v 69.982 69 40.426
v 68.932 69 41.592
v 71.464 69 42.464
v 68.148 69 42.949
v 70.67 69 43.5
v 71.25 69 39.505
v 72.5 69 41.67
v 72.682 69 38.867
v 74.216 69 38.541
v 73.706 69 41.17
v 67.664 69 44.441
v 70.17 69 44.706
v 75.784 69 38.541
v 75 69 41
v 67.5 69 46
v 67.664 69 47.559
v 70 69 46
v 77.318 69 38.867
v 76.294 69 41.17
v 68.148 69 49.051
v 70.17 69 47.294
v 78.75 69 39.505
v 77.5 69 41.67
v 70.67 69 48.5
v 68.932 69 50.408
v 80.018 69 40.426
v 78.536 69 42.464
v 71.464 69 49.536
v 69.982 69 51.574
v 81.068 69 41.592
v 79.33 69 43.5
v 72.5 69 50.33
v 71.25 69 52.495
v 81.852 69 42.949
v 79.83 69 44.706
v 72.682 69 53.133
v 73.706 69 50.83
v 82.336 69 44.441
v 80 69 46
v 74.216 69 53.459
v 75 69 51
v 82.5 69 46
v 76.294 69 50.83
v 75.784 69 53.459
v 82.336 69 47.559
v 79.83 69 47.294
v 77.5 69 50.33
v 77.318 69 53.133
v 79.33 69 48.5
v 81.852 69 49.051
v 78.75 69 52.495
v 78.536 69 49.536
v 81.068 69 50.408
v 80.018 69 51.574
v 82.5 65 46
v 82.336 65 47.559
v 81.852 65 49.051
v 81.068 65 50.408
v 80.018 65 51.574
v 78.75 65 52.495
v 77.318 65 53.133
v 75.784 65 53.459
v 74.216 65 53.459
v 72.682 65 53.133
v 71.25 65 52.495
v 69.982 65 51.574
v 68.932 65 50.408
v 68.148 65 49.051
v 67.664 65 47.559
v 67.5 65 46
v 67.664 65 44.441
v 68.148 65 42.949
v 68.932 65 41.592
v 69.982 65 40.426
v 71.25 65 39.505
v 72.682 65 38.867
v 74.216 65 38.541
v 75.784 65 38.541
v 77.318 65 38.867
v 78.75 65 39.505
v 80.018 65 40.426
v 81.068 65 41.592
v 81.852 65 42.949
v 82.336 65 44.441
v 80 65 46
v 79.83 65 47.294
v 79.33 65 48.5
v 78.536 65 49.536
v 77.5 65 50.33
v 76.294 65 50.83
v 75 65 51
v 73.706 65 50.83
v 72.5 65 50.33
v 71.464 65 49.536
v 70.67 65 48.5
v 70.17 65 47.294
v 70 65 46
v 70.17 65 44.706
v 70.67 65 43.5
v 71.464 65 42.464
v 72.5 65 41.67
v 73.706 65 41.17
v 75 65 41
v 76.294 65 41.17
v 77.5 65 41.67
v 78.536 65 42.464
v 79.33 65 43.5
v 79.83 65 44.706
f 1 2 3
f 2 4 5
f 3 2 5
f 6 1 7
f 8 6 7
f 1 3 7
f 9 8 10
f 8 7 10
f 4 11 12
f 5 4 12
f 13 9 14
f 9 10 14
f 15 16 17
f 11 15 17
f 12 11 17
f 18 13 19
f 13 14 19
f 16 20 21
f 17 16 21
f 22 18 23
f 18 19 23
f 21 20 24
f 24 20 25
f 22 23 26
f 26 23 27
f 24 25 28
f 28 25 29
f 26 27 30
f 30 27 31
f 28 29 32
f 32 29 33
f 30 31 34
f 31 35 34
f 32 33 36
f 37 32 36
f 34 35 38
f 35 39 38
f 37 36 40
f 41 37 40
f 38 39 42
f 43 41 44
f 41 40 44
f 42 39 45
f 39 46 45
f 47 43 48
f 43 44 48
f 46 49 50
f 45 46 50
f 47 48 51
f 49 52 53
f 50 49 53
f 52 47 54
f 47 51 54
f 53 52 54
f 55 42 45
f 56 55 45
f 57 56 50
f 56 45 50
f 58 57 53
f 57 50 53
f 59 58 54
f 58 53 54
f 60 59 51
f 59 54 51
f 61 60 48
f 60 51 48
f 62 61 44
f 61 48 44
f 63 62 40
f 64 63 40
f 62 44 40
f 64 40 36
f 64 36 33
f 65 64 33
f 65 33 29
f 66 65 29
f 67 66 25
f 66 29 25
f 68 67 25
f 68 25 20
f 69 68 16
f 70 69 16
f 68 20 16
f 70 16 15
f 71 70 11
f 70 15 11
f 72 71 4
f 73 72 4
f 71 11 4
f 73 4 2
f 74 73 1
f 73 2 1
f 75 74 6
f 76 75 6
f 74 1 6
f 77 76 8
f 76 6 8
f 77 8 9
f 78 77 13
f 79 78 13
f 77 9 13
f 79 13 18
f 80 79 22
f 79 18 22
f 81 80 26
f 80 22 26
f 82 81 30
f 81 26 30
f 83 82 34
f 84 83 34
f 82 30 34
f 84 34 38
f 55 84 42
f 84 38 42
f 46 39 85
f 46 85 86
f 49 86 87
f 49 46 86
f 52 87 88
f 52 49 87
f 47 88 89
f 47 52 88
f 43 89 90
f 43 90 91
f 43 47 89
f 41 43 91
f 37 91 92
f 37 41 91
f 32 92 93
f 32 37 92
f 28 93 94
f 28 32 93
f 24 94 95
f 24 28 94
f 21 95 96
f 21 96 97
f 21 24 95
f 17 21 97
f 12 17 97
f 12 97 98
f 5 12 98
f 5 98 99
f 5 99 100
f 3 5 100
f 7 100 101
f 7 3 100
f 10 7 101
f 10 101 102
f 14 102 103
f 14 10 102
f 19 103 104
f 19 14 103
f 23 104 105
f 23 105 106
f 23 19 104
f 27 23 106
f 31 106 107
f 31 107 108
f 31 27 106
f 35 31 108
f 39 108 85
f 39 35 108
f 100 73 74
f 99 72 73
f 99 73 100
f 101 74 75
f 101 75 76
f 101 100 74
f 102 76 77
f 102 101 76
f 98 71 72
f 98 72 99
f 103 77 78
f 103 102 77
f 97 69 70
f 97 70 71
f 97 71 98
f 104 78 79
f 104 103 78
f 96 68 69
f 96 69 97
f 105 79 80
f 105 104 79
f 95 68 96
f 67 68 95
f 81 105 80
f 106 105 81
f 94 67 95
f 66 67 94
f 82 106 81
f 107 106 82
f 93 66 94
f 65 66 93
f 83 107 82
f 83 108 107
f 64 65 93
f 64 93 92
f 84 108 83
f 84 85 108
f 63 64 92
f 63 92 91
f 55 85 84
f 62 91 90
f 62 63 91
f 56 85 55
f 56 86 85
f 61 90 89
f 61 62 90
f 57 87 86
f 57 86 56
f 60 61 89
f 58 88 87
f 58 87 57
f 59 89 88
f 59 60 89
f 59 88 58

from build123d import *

# Parameters (mm, degrees)
CYLINDER416_R     = 5
CYLINDER416_DEPTH = 4
CYLINDER415_R     = 7.5
CYLINDER415_DEPTH = 4


with BuildPart() as cylinder:
    # Cylinder416 → Cylinder416 (new body)
    with BuildSketch(Plane(origin=(75, 69, 46), x_dir=(1, 0, 0), z_dir=(0, -1, 0))):
        Circle(CYLINDER416_R)
    extrude(amount=CYLINDER416_DEPTH)


with BuildPart() as cut004026018020025012002:
    # Cylinder415 → Cylinder415 (new body)
    with BuildSketch(Plane(origin=(75, 69, 46), x_dir=(1, 0, 0), z_dir=(0, -1, 0))):
        Circle(CYLINDER415_R)
    extrude(amount=CYLINDER415_DEPTH)

    # Cut004026018020025012002: cut Cylinder
    add(cylinder.part, mode=Mode.SUBTRACT)


solid = cut004026018020025012002.part
